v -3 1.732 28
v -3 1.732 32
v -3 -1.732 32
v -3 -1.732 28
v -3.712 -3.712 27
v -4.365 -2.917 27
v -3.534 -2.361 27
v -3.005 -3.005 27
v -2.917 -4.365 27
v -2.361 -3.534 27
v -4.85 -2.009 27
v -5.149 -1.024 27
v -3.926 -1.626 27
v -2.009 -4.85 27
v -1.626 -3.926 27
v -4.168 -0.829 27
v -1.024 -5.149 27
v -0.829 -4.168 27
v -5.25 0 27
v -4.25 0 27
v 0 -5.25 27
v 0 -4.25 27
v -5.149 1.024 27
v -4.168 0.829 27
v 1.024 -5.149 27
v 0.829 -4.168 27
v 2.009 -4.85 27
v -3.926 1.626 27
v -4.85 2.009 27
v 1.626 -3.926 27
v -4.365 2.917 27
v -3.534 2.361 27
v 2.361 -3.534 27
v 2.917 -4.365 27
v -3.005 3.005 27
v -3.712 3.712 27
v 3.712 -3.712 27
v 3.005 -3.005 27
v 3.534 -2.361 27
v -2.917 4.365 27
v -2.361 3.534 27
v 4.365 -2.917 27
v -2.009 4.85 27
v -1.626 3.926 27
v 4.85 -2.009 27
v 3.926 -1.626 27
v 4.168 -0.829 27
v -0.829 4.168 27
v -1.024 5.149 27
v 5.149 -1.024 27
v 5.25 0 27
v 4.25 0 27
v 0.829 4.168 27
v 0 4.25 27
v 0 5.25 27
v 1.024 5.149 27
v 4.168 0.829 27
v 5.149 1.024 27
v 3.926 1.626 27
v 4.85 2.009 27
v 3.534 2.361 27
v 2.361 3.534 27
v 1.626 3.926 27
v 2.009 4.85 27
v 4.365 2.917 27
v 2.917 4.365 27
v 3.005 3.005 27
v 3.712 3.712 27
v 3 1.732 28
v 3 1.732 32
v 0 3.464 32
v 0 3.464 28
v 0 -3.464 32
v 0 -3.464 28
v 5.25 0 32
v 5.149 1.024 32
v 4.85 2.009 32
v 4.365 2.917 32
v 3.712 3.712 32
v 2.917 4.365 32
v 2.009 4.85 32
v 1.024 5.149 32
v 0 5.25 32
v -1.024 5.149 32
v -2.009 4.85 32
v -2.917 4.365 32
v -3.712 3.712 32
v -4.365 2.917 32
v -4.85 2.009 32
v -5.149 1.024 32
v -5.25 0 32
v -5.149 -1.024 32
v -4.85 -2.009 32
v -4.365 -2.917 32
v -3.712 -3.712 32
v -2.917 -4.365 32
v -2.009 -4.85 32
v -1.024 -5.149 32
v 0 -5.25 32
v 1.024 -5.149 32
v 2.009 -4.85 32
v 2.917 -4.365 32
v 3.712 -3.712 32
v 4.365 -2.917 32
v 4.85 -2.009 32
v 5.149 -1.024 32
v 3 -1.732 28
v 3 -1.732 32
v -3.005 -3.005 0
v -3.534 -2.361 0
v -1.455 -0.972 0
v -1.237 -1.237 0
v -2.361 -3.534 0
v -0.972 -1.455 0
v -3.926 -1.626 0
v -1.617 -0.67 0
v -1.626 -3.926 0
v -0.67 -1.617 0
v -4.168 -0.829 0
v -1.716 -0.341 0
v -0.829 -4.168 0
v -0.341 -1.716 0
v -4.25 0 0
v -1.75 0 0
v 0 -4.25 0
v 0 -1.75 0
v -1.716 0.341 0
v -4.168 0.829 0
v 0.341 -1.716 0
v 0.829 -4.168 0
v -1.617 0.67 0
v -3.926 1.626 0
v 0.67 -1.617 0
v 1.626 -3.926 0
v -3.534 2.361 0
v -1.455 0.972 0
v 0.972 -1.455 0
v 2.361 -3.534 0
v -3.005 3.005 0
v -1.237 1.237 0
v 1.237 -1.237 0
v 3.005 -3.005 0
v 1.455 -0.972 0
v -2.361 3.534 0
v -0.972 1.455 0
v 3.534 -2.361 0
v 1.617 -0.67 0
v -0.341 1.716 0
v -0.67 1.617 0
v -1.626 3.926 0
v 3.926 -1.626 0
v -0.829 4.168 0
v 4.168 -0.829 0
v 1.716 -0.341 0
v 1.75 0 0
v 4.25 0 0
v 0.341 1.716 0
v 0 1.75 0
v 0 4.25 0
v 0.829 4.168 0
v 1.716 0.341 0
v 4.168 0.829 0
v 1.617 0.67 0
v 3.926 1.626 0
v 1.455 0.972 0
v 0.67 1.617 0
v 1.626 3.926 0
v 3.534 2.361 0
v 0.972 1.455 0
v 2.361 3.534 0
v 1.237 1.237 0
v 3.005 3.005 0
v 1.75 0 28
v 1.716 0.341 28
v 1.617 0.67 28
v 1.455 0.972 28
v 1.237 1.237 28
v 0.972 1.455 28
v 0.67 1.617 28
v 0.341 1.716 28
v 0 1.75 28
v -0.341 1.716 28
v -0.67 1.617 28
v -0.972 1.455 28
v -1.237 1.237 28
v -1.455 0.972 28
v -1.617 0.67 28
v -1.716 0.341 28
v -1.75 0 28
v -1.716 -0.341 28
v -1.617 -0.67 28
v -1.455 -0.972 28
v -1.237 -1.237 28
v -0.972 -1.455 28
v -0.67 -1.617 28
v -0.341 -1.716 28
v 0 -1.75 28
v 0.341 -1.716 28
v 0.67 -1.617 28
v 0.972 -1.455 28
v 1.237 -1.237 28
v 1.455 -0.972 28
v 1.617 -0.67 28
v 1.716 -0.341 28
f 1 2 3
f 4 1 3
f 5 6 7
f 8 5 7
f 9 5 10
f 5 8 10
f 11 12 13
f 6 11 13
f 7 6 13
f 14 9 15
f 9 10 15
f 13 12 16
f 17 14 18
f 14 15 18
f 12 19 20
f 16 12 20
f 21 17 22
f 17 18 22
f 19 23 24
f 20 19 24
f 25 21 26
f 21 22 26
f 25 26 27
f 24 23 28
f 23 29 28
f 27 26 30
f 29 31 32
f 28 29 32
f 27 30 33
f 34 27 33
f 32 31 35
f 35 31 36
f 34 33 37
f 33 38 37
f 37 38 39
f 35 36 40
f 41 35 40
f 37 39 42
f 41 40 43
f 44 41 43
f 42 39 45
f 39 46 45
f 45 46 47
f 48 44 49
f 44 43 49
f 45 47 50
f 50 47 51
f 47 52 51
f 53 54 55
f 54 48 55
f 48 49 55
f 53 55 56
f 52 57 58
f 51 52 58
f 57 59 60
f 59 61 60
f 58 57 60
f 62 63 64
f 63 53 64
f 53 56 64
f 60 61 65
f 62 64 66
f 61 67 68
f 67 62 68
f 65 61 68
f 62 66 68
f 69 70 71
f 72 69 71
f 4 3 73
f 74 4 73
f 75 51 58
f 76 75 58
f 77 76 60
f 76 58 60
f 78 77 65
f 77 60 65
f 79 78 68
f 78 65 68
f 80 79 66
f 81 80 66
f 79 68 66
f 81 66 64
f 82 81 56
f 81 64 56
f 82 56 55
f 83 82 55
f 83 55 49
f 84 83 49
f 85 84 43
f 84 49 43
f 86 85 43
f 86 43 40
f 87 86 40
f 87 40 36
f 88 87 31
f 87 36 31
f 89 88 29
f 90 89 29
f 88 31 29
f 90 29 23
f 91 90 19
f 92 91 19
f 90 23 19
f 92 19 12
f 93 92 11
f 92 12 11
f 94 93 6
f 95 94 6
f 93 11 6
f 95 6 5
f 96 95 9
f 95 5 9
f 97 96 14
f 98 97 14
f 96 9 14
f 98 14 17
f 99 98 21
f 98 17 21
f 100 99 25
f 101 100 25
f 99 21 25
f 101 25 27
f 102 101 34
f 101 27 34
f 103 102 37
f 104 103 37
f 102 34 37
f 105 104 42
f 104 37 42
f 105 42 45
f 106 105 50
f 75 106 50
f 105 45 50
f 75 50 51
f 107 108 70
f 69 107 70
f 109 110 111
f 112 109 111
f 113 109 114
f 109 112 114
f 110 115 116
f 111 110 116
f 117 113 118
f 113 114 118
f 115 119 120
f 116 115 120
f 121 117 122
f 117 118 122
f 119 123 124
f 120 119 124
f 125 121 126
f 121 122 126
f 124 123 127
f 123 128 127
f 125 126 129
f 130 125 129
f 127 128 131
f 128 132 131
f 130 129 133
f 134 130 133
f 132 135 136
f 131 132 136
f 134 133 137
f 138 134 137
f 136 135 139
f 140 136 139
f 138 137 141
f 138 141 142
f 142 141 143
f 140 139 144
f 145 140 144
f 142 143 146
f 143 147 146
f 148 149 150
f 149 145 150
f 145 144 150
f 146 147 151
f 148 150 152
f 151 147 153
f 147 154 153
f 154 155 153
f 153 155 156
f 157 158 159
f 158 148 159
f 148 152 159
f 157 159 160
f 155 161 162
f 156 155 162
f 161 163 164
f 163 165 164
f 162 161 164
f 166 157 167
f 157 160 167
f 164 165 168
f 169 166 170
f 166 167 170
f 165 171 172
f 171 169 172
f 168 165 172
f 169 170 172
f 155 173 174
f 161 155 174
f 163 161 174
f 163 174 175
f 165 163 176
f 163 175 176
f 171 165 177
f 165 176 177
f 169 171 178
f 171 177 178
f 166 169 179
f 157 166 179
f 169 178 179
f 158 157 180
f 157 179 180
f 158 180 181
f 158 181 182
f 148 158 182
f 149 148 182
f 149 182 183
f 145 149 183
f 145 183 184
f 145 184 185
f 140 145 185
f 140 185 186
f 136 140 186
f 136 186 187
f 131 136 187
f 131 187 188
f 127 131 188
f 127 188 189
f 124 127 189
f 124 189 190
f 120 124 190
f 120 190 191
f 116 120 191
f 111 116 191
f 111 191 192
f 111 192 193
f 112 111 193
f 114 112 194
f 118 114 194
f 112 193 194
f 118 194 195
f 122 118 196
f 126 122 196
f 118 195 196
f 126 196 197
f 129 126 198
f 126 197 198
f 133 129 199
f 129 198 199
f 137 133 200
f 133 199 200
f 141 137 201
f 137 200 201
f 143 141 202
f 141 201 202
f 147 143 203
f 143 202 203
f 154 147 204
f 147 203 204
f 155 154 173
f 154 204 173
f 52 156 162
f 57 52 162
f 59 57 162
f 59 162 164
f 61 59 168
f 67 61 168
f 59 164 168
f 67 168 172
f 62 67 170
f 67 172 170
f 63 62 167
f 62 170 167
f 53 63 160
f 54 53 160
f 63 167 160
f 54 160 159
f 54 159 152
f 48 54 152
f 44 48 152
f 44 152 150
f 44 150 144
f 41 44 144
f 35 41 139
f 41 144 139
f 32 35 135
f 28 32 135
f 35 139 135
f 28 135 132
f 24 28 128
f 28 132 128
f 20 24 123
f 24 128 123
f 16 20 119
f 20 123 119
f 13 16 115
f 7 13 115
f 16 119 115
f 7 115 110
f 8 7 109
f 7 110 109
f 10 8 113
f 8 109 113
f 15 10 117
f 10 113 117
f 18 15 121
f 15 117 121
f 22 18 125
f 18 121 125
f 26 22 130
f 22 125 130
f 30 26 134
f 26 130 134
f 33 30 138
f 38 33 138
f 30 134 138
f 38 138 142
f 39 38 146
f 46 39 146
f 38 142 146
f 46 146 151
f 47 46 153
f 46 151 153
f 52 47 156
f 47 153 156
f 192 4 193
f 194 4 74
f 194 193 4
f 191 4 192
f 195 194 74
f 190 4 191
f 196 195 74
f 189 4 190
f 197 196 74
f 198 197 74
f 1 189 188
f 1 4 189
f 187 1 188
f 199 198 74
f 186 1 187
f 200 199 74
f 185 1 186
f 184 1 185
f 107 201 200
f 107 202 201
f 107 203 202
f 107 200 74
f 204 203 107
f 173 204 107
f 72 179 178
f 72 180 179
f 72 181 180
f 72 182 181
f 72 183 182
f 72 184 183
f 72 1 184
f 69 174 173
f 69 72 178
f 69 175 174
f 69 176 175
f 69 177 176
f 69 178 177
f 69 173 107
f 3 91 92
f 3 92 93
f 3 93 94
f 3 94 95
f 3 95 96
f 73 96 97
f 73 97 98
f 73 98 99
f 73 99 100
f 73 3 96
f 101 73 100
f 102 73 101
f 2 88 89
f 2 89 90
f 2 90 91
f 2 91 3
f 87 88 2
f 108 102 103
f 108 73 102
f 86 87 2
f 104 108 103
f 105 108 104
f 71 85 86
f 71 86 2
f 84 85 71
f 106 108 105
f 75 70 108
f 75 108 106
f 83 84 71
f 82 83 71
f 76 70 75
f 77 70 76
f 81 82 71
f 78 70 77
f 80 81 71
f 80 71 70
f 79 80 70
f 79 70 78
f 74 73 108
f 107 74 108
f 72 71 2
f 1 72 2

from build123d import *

# Parameters (mm, degrees)
SKETCH1_R           = 4.25
BOSS_EXTRUDE1_DEPTH = 27
SKETCH2_R           = 5.25
BOSS_EXTRUDE2_DEPTH = 5
SKETCH7_R           = 1.75
CUT_EXTRUDE4_DEPTH  = 33
CUT_EXTRUDE6_DEPTH  = 4


with BuildPart() as part:
    # Sketch1 → Boss-Extrude1 (new body)
    with BuildSketch(Plane.XY):
        Circle(SKETCH1_R)
    extrude(amount=BOSS_EXTRUDE1_DEPTH)

    # Sketch2 → Boss-Extrude2 (add)
    with BuildSketch(Plane.XY.offset(27)):
        Circle(SKETCH2_R)
    extrude(amount=BOSS_EXTRUDE2_DEPTH)

    # Sketch7 → Cut-Extrude4 (cut, through all)
    with BuildSketch(Plane.XY.offset(32)):
        Circle(SKETCH7_R)
    extrude(amount=-CUT_EXTRUDE4_DEPTH, mode=Mode.SUBTRACT)

    # Sketch9 → Cut-Extrude6 (cut)
    with BuildSketch(Plane.XY.offset(32)):
        Polygon((0, 3.464101615), (-3, 1.732050808), (-3, -1.732050808), (0, -3.464101615), (3, -1.732050808), (3, 1.732050808), align=None)
    extrude(amount=-CUT_EXTRUDE6_DEPTH, mode=Mode.SUBTRACT)


solid = part.part
